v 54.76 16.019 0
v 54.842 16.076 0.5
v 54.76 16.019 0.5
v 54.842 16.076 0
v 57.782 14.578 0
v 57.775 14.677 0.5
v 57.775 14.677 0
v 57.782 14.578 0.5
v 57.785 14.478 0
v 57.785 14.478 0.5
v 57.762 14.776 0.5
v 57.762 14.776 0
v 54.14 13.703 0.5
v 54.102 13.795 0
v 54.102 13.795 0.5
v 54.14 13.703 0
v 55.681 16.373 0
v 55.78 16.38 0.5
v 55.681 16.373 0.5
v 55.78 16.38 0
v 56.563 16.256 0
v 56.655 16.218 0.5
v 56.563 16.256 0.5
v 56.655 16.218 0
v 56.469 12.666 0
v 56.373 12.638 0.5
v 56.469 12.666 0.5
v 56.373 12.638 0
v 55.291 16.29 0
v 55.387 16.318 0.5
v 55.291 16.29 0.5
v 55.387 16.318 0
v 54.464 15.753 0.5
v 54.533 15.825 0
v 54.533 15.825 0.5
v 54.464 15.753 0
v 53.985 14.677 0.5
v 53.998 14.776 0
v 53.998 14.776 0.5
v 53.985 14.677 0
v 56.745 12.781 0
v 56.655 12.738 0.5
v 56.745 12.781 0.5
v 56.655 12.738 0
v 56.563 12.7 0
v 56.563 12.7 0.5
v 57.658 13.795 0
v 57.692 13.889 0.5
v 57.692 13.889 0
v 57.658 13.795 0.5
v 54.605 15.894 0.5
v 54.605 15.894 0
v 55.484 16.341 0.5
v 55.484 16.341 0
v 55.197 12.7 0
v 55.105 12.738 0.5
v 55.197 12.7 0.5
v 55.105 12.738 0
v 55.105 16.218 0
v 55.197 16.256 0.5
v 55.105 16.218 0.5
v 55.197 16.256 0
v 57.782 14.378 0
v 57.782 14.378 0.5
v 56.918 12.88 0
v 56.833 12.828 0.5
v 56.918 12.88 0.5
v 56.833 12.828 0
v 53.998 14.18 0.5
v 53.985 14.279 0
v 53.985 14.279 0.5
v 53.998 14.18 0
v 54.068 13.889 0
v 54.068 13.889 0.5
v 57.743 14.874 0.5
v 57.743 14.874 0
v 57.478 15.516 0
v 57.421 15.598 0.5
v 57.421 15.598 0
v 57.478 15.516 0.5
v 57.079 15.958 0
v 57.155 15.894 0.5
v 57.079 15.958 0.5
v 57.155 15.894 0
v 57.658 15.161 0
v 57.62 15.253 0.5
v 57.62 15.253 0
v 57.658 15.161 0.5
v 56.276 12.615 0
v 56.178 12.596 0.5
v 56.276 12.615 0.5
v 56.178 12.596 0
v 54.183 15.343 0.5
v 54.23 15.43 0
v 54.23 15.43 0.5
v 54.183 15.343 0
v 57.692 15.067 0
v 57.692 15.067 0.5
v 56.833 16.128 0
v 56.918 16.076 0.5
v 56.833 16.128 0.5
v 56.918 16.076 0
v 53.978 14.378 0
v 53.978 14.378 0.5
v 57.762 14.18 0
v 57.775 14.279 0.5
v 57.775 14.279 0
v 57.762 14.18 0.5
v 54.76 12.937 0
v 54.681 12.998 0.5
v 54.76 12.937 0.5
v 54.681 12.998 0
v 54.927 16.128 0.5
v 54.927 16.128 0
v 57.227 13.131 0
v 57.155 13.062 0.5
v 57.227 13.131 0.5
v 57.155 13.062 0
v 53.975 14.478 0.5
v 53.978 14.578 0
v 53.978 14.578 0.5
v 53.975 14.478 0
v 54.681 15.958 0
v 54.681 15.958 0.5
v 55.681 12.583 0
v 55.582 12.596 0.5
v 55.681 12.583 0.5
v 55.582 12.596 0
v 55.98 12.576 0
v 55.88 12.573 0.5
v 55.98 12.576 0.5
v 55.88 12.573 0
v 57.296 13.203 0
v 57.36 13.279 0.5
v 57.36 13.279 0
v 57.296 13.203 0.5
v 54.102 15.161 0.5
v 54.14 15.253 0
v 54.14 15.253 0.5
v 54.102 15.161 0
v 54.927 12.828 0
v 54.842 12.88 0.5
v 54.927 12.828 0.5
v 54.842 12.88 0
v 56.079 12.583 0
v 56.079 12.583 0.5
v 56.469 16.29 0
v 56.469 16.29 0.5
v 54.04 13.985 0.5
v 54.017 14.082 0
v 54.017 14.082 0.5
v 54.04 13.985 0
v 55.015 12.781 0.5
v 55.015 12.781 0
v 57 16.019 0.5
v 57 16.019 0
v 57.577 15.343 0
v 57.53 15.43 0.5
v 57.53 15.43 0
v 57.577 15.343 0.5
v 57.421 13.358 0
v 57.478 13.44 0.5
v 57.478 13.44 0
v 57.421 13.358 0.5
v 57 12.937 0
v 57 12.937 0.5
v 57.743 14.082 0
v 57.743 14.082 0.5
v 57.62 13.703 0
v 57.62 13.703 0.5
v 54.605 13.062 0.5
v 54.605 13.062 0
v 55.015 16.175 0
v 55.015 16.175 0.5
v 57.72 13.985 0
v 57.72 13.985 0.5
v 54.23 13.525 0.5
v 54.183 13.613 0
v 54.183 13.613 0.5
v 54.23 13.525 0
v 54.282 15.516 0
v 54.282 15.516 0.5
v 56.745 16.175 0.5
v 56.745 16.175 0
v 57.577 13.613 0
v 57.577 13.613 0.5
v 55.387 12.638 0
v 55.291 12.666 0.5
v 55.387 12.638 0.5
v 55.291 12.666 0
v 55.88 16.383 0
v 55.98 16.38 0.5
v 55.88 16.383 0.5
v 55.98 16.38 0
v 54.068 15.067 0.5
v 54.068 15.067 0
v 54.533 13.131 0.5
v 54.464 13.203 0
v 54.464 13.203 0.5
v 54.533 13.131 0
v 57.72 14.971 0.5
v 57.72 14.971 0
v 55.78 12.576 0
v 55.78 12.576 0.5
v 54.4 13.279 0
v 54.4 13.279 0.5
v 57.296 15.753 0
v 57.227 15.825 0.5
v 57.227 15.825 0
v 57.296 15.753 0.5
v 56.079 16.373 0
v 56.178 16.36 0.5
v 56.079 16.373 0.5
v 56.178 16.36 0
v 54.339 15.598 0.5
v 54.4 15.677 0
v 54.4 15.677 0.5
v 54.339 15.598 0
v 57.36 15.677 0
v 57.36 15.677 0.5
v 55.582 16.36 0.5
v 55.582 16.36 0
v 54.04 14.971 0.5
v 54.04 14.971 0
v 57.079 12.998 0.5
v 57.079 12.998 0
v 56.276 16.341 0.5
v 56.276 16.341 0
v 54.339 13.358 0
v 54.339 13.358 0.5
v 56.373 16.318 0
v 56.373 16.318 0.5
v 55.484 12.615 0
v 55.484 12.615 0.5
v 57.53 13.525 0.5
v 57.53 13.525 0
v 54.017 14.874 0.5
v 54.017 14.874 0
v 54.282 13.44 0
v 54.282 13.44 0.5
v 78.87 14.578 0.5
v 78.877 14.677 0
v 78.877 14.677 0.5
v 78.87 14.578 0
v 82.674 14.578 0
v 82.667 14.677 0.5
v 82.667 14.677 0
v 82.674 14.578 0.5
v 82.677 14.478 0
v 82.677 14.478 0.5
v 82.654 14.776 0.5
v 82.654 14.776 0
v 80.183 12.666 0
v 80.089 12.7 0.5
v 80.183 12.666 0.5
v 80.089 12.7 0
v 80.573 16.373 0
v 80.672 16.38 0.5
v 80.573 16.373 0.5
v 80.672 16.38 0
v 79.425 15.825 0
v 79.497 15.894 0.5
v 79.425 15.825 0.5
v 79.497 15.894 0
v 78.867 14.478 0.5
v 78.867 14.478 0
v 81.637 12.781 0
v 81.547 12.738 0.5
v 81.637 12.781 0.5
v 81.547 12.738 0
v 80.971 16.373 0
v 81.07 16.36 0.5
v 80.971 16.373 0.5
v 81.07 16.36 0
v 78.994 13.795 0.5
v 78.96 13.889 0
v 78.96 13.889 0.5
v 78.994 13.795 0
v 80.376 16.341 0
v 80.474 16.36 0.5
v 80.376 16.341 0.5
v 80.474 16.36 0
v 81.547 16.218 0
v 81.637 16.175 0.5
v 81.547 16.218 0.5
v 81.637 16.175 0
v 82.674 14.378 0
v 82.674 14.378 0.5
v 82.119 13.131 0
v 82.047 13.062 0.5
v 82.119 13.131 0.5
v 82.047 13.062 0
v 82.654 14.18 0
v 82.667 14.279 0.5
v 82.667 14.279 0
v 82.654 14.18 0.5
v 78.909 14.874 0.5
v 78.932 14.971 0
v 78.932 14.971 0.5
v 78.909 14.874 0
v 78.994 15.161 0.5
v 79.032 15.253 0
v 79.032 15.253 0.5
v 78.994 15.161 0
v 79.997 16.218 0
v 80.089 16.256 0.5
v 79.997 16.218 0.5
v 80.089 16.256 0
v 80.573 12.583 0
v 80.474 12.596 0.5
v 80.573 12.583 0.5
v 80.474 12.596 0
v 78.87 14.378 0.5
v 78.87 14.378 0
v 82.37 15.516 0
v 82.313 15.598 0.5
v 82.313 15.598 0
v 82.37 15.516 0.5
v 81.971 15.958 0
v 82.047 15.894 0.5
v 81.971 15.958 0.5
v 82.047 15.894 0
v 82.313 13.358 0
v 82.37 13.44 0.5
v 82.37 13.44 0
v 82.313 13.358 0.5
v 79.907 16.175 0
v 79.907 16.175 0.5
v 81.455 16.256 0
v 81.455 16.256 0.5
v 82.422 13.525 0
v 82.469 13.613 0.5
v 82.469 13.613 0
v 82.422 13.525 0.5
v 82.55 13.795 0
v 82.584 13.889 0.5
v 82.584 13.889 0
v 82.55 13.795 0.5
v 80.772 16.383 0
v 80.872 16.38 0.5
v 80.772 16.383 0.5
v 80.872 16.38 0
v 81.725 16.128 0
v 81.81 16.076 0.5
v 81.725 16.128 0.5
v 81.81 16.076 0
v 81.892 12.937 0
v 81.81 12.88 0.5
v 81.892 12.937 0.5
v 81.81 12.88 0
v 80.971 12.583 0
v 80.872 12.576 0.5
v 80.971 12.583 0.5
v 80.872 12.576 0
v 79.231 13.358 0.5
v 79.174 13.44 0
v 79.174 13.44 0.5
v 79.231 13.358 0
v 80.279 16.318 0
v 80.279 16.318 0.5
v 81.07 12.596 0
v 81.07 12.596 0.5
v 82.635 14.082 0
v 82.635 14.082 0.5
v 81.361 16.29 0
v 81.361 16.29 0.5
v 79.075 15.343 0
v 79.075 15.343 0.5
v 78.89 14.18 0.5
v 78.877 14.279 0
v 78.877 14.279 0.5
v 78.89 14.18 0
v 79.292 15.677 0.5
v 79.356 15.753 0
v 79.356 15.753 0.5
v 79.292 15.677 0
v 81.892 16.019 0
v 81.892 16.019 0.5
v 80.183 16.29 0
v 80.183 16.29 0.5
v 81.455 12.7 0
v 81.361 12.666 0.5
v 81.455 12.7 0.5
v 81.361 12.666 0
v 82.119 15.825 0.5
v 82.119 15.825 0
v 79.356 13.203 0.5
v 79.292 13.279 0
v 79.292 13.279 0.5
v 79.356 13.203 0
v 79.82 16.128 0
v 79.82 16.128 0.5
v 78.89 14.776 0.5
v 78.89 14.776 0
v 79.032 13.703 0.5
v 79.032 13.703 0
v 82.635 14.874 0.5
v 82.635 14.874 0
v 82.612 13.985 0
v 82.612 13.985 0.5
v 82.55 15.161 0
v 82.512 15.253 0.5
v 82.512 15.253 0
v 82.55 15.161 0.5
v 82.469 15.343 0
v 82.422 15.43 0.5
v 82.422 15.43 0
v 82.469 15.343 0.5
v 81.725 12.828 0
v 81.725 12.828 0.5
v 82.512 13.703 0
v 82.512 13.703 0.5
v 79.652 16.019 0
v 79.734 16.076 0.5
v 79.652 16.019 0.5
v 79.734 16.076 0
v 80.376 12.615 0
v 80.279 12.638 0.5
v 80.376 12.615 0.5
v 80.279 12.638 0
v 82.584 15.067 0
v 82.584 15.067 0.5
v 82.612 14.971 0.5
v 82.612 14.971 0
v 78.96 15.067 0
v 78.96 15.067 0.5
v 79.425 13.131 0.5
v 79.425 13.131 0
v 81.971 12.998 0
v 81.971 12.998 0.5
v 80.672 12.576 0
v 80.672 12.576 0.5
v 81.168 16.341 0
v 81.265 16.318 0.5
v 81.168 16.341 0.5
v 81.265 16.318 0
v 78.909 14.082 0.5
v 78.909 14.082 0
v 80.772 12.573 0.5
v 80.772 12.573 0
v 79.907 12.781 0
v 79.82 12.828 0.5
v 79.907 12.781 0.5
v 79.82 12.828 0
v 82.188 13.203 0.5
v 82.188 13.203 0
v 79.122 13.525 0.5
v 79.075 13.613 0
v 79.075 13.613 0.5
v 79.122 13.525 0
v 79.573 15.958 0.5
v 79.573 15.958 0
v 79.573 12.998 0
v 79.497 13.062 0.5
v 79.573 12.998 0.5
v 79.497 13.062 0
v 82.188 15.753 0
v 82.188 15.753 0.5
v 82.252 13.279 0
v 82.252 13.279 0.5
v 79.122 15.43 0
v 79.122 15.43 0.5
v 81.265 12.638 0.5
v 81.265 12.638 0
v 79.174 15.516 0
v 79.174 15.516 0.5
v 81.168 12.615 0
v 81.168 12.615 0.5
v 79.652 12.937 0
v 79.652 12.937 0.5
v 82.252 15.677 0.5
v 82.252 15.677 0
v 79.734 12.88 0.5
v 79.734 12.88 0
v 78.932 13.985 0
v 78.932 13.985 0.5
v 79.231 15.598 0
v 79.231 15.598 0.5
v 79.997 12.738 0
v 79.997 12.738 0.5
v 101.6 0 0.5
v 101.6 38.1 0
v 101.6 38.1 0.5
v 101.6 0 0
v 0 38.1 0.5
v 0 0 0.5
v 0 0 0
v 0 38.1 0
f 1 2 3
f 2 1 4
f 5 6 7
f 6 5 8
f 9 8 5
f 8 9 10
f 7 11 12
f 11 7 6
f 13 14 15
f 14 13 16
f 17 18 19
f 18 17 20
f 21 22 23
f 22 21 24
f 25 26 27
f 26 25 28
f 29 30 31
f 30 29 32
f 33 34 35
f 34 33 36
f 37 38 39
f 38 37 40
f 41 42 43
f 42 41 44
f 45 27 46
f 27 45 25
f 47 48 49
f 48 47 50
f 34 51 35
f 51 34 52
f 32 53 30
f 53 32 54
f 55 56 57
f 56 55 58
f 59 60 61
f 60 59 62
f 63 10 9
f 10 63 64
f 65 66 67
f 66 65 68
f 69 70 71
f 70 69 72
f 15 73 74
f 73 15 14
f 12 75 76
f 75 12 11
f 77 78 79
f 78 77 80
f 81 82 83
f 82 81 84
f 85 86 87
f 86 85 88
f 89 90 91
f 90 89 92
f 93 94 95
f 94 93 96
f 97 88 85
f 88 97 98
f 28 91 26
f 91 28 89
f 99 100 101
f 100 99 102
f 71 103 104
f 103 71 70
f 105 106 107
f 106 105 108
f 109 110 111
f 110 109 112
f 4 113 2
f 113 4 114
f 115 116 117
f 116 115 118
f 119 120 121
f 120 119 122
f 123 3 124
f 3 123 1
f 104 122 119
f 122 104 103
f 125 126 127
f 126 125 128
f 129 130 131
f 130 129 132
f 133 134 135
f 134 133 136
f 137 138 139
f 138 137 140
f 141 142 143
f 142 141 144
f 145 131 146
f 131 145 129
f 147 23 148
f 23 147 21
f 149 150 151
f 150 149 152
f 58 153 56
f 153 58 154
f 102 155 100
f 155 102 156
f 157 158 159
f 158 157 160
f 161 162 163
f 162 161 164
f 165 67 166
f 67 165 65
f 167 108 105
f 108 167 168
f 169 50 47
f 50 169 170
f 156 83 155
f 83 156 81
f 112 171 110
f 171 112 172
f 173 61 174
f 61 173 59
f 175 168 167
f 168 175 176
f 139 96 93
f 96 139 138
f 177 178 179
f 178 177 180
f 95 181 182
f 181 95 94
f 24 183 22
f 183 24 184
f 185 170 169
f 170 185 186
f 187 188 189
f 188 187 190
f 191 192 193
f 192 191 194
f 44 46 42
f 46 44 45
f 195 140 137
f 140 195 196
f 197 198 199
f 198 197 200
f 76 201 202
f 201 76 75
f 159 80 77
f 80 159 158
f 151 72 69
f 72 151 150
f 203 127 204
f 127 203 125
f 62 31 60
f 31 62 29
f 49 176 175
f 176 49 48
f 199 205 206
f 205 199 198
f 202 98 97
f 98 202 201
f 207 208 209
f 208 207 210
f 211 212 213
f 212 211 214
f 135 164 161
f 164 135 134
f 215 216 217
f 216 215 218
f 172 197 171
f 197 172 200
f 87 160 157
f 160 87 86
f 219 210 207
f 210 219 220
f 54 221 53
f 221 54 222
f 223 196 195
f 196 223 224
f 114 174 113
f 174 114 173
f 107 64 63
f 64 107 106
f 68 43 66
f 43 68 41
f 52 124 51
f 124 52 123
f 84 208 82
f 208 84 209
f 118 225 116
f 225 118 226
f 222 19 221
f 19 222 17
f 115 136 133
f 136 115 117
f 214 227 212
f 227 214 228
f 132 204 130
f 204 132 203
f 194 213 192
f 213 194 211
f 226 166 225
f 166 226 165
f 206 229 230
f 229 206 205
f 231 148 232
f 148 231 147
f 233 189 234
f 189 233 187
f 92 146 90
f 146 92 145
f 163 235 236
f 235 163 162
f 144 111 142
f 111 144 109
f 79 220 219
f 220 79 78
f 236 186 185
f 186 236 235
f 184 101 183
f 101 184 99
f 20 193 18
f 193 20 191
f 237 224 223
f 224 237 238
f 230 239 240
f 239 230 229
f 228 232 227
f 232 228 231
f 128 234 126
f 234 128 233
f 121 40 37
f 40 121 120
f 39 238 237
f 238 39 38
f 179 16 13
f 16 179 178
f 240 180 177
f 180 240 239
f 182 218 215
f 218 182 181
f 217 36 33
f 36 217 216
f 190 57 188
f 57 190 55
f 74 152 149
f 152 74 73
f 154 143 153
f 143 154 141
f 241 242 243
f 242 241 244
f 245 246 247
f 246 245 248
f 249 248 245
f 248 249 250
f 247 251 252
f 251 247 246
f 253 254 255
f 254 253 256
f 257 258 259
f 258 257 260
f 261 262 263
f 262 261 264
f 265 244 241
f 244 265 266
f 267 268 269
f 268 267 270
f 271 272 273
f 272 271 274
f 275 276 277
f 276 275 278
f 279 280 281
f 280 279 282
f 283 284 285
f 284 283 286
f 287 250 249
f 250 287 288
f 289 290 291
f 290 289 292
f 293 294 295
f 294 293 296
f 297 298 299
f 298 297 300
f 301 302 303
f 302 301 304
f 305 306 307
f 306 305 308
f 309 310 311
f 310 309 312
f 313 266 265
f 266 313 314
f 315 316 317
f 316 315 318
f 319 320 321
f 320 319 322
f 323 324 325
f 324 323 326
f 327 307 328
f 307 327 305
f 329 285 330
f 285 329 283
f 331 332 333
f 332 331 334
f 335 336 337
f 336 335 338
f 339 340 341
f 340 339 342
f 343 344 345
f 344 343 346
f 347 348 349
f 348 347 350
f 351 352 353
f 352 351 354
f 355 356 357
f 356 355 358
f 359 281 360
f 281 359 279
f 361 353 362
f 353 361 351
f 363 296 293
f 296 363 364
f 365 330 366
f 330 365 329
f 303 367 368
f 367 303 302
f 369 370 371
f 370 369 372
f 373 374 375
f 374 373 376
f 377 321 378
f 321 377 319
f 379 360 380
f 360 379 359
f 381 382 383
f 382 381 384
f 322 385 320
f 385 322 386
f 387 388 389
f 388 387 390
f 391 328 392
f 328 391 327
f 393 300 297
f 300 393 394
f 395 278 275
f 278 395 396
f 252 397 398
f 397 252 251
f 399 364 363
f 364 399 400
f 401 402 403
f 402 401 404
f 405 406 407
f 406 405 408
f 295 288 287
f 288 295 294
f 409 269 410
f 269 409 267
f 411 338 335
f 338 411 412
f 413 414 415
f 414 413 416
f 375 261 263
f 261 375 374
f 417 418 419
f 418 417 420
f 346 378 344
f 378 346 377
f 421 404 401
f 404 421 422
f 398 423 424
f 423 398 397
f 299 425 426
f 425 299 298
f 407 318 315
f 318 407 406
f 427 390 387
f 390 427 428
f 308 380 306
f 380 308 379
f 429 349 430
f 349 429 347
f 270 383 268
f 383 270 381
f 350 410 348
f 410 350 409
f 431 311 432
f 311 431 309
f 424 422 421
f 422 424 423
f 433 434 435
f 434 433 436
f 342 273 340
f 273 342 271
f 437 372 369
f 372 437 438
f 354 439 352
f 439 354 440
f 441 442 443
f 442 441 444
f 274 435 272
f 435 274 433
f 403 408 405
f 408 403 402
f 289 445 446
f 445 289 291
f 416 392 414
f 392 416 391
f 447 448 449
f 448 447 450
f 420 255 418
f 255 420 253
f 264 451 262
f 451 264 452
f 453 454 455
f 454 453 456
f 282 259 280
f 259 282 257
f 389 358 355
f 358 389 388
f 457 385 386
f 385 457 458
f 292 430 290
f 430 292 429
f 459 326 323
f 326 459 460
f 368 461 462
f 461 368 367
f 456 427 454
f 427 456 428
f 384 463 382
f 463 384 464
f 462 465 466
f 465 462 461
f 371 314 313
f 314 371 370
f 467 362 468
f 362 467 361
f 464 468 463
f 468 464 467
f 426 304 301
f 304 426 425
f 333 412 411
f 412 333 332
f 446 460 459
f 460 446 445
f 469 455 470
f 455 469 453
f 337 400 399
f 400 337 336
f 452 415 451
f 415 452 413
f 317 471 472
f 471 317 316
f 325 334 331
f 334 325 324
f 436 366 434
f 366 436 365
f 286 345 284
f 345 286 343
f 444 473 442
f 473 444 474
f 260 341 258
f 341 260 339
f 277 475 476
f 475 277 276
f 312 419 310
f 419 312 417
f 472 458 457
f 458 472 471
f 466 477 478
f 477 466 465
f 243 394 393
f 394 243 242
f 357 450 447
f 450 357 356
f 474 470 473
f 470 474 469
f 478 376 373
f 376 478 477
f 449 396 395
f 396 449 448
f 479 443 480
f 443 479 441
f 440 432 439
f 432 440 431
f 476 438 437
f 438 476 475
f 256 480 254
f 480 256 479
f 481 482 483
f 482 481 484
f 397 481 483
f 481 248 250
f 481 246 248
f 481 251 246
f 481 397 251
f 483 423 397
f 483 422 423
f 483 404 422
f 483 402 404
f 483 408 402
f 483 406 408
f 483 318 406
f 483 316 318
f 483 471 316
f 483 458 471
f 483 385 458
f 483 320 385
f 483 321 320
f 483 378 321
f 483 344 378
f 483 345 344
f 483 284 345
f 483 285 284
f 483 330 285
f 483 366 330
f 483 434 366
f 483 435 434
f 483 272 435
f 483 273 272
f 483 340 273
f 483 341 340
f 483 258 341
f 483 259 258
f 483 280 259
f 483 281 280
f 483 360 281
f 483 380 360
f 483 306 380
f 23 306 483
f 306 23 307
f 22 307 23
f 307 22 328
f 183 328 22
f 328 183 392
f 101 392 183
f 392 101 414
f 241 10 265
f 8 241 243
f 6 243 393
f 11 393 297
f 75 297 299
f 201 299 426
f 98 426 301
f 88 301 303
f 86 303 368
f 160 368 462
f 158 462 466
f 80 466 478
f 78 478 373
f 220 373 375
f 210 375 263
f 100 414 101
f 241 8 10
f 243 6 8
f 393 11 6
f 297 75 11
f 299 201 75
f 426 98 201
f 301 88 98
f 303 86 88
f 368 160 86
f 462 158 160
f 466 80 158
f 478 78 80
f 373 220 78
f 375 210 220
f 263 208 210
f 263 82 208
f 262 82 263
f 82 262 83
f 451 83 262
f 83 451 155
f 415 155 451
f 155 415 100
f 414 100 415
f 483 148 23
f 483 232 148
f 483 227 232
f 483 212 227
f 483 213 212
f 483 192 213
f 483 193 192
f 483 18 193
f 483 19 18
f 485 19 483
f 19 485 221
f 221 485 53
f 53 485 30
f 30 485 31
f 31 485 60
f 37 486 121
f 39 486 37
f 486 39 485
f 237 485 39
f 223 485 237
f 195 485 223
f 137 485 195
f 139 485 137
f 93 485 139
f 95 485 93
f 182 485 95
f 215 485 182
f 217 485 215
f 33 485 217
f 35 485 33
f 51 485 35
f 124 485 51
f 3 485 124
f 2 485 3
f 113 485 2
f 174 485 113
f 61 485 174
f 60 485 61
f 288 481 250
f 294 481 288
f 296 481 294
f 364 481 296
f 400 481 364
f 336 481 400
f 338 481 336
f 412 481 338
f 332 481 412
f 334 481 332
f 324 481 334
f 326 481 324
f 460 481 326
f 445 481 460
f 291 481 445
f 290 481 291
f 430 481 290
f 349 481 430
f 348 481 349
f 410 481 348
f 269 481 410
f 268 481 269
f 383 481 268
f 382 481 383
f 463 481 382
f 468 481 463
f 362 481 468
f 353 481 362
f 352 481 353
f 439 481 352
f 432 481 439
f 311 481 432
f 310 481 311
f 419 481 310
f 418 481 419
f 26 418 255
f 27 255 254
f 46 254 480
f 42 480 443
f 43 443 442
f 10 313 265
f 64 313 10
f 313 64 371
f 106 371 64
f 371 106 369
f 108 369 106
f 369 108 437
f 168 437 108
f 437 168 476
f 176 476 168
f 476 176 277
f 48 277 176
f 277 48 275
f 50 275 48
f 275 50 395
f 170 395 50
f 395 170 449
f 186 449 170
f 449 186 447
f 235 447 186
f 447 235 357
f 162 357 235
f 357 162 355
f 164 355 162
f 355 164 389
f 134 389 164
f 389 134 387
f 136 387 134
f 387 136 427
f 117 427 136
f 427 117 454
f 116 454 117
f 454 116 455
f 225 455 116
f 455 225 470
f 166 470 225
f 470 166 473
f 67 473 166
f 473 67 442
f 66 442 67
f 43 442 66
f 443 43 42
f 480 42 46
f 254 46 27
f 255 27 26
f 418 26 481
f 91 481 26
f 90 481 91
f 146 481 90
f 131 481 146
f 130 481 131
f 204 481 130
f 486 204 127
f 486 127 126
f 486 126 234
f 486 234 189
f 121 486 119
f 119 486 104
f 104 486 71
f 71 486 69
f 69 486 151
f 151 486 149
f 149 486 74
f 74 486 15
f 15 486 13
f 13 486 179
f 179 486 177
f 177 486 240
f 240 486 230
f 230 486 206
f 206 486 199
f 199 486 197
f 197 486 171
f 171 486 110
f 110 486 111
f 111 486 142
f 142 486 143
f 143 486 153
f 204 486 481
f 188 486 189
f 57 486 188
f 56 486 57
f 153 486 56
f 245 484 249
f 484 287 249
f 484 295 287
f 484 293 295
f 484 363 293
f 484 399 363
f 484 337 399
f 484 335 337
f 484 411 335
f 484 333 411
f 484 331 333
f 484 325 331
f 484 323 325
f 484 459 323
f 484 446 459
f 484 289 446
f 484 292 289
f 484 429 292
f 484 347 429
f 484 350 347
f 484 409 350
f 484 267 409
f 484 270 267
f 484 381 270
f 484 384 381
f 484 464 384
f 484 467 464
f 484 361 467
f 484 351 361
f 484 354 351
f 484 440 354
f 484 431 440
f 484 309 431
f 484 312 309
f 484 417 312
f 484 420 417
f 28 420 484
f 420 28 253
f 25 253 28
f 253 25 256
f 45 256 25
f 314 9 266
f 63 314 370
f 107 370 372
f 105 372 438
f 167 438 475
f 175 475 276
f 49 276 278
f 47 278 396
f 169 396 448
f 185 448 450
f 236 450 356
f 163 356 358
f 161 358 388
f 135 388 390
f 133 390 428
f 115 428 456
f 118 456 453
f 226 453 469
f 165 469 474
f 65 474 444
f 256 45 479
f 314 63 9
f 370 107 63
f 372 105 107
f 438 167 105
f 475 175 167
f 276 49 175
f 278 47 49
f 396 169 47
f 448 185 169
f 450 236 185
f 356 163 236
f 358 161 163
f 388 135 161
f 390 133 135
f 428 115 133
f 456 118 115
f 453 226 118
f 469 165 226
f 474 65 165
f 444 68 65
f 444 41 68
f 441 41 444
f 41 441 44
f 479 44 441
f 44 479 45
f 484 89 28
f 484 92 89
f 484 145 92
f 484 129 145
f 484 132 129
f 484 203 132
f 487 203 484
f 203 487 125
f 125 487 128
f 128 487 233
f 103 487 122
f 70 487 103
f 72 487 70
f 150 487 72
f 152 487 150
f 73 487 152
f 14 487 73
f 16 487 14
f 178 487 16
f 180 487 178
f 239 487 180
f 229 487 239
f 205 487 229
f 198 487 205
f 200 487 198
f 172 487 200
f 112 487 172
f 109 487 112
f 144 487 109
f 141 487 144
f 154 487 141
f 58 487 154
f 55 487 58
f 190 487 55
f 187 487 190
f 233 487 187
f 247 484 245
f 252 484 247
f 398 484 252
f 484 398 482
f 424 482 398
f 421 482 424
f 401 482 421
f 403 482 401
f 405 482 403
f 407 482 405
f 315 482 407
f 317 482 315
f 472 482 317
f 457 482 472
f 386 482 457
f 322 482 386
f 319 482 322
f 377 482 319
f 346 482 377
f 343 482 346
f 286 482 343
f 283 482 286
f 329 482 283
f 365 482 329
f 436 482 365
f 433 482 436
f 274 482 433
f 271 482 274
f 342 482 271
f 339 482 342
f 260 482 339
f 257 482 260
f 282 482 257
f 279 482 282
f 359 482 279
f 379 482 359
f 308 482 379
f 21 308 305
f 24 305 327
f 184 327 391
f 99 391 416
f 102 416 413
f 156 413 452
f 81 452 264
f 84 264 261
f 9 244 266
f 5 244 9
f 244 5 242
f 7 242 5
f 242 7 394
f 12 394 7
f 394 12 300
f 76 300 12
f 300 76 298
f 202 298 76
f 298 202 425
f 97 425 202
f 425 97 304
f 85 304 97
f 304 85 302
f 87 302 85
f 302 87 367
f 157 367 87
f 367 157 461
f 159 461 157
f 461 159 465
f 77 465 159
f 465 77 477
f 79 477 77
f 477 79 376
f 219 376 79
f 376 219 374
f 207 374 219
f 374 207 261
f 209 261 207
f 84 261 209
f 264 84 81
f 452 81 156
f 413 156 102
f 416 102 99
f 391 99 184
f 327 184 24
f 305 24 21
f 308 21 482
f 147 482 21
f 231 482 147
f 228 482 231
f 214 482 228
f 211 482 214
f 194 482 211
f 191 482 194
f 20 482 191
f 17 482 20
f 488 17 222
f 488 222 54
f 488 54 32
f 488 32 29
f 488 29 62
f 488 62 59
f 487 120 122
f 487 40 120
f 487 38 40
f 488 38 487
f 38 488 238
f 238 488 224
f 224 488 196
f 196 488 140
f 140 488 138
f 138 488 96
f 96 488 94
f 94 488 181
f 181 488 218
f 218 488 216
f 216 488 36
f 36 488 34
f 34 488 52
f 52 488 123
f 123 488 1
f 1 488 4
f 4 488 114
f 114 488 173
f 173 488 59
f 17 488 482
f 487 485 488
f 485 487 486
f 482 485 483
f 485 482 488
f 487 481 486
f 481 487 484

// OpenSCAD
// file: ../lib/common.scad
// Shared helpers for the AR turntable part models.
//
// Every part file holds a parameter table P. Each row is:
//   [id, description, value_mm, evidence, display_unit, source_or_how_to_check]
//
// Evidence codes:
//   F  factory document          O  owner report
//   C  community drawing         S  industry standard
//   D  design choice             M  measured for this repository
//   DV derived from cited sources, not yet verified on a part. The source
//      column holds the derivation: the formula, each input with its source,
//      and how to verify. Drawn in blue. Needs a row in TO-CONFIRM.md whose
//      value starts with "Derived:". Change to M once measured.
//   PH placeholder: chosen only so the model has a shape. It is NOT a
//      measurement. Drawn in red. Replace it, and change the code, once it
//      is measured.
//
// Every part file also emits metadata naming the part page, the part, the
// version, the material and the tables it fits, each fit with its evidence:
//   ["part", "parts/counterweight.md"], ["part_name", "Counterweight"],
//   ["version", "XA brass weight, 1961 to 1979"], ["material", "Brass"],
//   ["fits", [["XA", "Fitted by AR", "XA service manual p. 4"], ["XB", "Unconfirmed", ""]]]
// The fit word is one of: Fitted by AR, Fits, Fits with a change, Does not
// fit, Unconfirmed. build.py prints these in the title block and writes the
// drawings table of cad/README.md from them.
// License: CC BY-SA 4.0. See LICENSE at the repository root.

IN = 25.4;      // one inch, in mm. All model geometry is in mm.
EPS = 0.01;     // overlap so boolean cuts do not leave zero-thickness skins
$fa = 2;
$fs = 0.1;

// Value of parameter `id` in table t.
function pv(t, id) = t[search([id], t)[0]][2];

// Print part data for cad/tools/build.py, which reads it from the console.
module emit(meta, params, dims = []) {
    echo(META = meta);
    for (row = params) echo(PARAM = row);
    for (row = dims) echo(DIM = row);
}

// Rounded rectangle prism: centered in XY, from z = 0 to z = h.
module rr_prism(l, w, h, r) {
    translate([-l / 2 + r, -w / 2, 0]) cube([l - 2 * r, w, h]);
    translate([-l / 2, -w / 2 + r, 0]) cube([l, w - 2 * r, h]);
    for (sx = [-1, 1], sy = [-1, 1])
        translate([sx * (l / 2 - r), sy * (w / 2 - r), 0]) cylinder(r = r, h = h);
}

// Slot along X: `c` is the distance between end-radius centers.
module slot_prism(c, w, h) {
    translate([-c / 2, -w / 2, 0]) cube([c, w, h]);
    for (sx = [-1, 1]) translate([sx * c / 2, 0, 0]) cylinder(d = w, h = h);
}
// main file
// XB hinge drilling template, from the hinge detail on drawing 114, revision S.
//
// The hinged cover existed only between ECO 1135 (14 September 1976) and
// ECO 1315 (28 January 1977). Two templates: one for the cover, one for the
// base. Each is a card held in the rear corner of the part: its end against
// the end of the cover or base, its long edge against the cover's lower edge or
// the base's top edge. Mark through the two holes, then turn it over for the
// other end. The 2.20 in against 60.6 mm conflict (DM4) stays red.
// Parameter IDs match TO-CONFIRM.md.
// License: CC BY-SA 4.0. See LICENSE at the repository root.
include <../lib/common.scad>

variant = 1;   // 1: cover, 2: base
flat = false;  // true exports the 1:1 cutting outline

P = concat([
    ["HT1", "Spacing between the paired holes", 0.98 * IN, "F", "in", "Drawing 114, revision S, hinge detail: 0.98 in, also printed 25 mm"],
], variant == 1 ? [
    ["DM4", "End of cover to first cover hole", 2.20 * IN, "PH", "in", "Drawing 114 prints 2.20 in and 60.6 mm, which do not convert (2.20 in is 55.9 mm). Measure a hinged XB cover"],
    ["HT2", "Cover hole row to lower edge of cover", 0.57 * IN, "F", "in", "Drawing 114: 0.57 in, also printed 14.5 mm"],
    ["HT3", "Cover hole diameter", 0.15 * IN, "F", "in", "Drawing 114: 0.15 in, also printed 4 mm"],
] : [
    ["HT5", "End of base to first base hole", 2.28 * IN, "F", "in", "Drawing 114: 2.28 in, also printed 58 mm"],
    ["HT4", "Base hole row to top edge of base", 1.00 * IN, "F", "in", "Drawing 114: 1.00 in, also printed 25.5 mm"],
    ["HT6", "Base hole diameter", 0.11 * IN, "F", "in", "Drawing 114: 0.11 in, also printed 2.8 mm. Pilot for a wood screw"],
    ["HT7", "Base hole depth, for the drill stop", 0.37 * IN, "F", "in", "Drawing 114: 0.37 in, also printed 9.5 mm. Not a feature of the card"],
], [
    ["HT8", "Card width", 1.5 * IN, "D", "in", "Design choice: wider than the hole row offset"],
    ["HT9", "Card length", 4.0 * IN, "D", "in", "Design choice: past the second hole"],
    ["HT10", "Card thickness", 0.5, "D", "mm", "Design choice: card or thin plastic"],
]);

first = variant == 1 ? pv(P, "DM4") : pv(P, "HT5");
row = variant == 1 ? pv(P, "HT2") : pv(P, "HT4");
hole = variant == 1 ? pv(P, "HT3") : pv(P, "HT6");
pair = pv(P, "HT1");
cw = pv(P, "HT8");
cl = pv(P, "HT9");
ct = pv(P, "HT10");

// x = 0 is the end of the cover or base; y = 0 is the reference edge.
module part() {
    difference() {
        cube([cl, cw, ct]);
        for (x = [first, first + pair]) translate([x, row, -1]) cylinder(d = hole, h = ct + 2);
    }
}

emit(
    [
        ["id", variant == 1 ? "hinge-template-xb-cover-card" : "hinge-template-xb-base-card"],
        ["title", variant == 1 ? "Hinge drilling template, XB cover" : "Hinge drilling template, XB base"],
        ["status", "PRELIMINARY"],
        ["part", "parts/hinge-template.md"],
        ["part_name", "Hinge drilling template"],
        ["version", variant == 1 ? "XB hinged cover, September 1976 to January 1977: cover holes" : "XB hinged cover, September 1976 to January 1977: base holes"],
        ["scope", "The hinge detail of drawing 114 only. The hinge itself and the cover outline are not drawn"],
        ["material", "Card or thin plastic"],
        ["density", 0.7],
        ["fits", [["XB", "Fits", "drawing 114 revision S; the hinge was added by ECO 1135 and deleted by ECO 1315, drawing 119 revision block"],
                  ["XA", "Unconfirmed", ""], ["AR77XB", "Unconfirmed", ""]]],
        ["make", "Print the 1:1 DXF or cut the card to the dimensions. Prick the two hole centers"],
        ["flat", true],
        ["variants", [[1, "Cover"], [2, "Base"]]],
        ["views", ["front", "top", "iso"]],
        ["notes", concat(variant == 1 ? [
            "DM4 is red: the drawing gives 2.20 in and 60.6 mm for the end-to-first-hole distance, and they disagree by 4.7 mm. Do not drill until a hinged cover is measured.",
            "Hold the card's end (x = 0) against the end of the cover and its long edge (y = 0) against the cover's lower edge.",
        ] : [
            "Hold the card's end (x = 0) against the end of the base and its long edge (y = 0) against the base's top edge. Drill 0.11 in pilot holes 0.37 in deep.",
            "The two rows are 1.26 in apart with the cover closed, per the same detail. Check that against your cover before drilling the base.",
        ], [
            "Use the same card at both ends: turn it over for the other end.",
            "Revision S hardware for the hinge: four #6 x 0.375 in wood screws, four #4-40 x 0.375 in screws, four #4-40 dome nuts (drawing 113).",
        ])],
    ],
    P,
    [
        ["top", "h", [0, cw, 0], [first, cw, 0], 9, variant == 1 ? "DM4" : "HT5"],
        ["top", "h", [first, cw, 0], [first + pair, cw, 0], 16, "HT1"],
        ["top", "v", [cl, 0, 0], [cl, row, 0], 9, variant == 1 ? "HT2" : "HT4"],
        ["top", "d", [first + pair, row, 0], hole / 2, 9, variant == 1 ? "HT3" : "HT6", "Ø", 315],
        ["top", "h", [0, 0, 0], [cl, 0, 0], -9, "HT9"],
        ["top", "v", [0, 0, 0], [0, cw, 0], -9, "HT8"],
        ["front", "v", [cl, 0, 0], [cl, 0, ct], 9, "HT10"],
    ]
);

if (flat) projection() part(); else part();
